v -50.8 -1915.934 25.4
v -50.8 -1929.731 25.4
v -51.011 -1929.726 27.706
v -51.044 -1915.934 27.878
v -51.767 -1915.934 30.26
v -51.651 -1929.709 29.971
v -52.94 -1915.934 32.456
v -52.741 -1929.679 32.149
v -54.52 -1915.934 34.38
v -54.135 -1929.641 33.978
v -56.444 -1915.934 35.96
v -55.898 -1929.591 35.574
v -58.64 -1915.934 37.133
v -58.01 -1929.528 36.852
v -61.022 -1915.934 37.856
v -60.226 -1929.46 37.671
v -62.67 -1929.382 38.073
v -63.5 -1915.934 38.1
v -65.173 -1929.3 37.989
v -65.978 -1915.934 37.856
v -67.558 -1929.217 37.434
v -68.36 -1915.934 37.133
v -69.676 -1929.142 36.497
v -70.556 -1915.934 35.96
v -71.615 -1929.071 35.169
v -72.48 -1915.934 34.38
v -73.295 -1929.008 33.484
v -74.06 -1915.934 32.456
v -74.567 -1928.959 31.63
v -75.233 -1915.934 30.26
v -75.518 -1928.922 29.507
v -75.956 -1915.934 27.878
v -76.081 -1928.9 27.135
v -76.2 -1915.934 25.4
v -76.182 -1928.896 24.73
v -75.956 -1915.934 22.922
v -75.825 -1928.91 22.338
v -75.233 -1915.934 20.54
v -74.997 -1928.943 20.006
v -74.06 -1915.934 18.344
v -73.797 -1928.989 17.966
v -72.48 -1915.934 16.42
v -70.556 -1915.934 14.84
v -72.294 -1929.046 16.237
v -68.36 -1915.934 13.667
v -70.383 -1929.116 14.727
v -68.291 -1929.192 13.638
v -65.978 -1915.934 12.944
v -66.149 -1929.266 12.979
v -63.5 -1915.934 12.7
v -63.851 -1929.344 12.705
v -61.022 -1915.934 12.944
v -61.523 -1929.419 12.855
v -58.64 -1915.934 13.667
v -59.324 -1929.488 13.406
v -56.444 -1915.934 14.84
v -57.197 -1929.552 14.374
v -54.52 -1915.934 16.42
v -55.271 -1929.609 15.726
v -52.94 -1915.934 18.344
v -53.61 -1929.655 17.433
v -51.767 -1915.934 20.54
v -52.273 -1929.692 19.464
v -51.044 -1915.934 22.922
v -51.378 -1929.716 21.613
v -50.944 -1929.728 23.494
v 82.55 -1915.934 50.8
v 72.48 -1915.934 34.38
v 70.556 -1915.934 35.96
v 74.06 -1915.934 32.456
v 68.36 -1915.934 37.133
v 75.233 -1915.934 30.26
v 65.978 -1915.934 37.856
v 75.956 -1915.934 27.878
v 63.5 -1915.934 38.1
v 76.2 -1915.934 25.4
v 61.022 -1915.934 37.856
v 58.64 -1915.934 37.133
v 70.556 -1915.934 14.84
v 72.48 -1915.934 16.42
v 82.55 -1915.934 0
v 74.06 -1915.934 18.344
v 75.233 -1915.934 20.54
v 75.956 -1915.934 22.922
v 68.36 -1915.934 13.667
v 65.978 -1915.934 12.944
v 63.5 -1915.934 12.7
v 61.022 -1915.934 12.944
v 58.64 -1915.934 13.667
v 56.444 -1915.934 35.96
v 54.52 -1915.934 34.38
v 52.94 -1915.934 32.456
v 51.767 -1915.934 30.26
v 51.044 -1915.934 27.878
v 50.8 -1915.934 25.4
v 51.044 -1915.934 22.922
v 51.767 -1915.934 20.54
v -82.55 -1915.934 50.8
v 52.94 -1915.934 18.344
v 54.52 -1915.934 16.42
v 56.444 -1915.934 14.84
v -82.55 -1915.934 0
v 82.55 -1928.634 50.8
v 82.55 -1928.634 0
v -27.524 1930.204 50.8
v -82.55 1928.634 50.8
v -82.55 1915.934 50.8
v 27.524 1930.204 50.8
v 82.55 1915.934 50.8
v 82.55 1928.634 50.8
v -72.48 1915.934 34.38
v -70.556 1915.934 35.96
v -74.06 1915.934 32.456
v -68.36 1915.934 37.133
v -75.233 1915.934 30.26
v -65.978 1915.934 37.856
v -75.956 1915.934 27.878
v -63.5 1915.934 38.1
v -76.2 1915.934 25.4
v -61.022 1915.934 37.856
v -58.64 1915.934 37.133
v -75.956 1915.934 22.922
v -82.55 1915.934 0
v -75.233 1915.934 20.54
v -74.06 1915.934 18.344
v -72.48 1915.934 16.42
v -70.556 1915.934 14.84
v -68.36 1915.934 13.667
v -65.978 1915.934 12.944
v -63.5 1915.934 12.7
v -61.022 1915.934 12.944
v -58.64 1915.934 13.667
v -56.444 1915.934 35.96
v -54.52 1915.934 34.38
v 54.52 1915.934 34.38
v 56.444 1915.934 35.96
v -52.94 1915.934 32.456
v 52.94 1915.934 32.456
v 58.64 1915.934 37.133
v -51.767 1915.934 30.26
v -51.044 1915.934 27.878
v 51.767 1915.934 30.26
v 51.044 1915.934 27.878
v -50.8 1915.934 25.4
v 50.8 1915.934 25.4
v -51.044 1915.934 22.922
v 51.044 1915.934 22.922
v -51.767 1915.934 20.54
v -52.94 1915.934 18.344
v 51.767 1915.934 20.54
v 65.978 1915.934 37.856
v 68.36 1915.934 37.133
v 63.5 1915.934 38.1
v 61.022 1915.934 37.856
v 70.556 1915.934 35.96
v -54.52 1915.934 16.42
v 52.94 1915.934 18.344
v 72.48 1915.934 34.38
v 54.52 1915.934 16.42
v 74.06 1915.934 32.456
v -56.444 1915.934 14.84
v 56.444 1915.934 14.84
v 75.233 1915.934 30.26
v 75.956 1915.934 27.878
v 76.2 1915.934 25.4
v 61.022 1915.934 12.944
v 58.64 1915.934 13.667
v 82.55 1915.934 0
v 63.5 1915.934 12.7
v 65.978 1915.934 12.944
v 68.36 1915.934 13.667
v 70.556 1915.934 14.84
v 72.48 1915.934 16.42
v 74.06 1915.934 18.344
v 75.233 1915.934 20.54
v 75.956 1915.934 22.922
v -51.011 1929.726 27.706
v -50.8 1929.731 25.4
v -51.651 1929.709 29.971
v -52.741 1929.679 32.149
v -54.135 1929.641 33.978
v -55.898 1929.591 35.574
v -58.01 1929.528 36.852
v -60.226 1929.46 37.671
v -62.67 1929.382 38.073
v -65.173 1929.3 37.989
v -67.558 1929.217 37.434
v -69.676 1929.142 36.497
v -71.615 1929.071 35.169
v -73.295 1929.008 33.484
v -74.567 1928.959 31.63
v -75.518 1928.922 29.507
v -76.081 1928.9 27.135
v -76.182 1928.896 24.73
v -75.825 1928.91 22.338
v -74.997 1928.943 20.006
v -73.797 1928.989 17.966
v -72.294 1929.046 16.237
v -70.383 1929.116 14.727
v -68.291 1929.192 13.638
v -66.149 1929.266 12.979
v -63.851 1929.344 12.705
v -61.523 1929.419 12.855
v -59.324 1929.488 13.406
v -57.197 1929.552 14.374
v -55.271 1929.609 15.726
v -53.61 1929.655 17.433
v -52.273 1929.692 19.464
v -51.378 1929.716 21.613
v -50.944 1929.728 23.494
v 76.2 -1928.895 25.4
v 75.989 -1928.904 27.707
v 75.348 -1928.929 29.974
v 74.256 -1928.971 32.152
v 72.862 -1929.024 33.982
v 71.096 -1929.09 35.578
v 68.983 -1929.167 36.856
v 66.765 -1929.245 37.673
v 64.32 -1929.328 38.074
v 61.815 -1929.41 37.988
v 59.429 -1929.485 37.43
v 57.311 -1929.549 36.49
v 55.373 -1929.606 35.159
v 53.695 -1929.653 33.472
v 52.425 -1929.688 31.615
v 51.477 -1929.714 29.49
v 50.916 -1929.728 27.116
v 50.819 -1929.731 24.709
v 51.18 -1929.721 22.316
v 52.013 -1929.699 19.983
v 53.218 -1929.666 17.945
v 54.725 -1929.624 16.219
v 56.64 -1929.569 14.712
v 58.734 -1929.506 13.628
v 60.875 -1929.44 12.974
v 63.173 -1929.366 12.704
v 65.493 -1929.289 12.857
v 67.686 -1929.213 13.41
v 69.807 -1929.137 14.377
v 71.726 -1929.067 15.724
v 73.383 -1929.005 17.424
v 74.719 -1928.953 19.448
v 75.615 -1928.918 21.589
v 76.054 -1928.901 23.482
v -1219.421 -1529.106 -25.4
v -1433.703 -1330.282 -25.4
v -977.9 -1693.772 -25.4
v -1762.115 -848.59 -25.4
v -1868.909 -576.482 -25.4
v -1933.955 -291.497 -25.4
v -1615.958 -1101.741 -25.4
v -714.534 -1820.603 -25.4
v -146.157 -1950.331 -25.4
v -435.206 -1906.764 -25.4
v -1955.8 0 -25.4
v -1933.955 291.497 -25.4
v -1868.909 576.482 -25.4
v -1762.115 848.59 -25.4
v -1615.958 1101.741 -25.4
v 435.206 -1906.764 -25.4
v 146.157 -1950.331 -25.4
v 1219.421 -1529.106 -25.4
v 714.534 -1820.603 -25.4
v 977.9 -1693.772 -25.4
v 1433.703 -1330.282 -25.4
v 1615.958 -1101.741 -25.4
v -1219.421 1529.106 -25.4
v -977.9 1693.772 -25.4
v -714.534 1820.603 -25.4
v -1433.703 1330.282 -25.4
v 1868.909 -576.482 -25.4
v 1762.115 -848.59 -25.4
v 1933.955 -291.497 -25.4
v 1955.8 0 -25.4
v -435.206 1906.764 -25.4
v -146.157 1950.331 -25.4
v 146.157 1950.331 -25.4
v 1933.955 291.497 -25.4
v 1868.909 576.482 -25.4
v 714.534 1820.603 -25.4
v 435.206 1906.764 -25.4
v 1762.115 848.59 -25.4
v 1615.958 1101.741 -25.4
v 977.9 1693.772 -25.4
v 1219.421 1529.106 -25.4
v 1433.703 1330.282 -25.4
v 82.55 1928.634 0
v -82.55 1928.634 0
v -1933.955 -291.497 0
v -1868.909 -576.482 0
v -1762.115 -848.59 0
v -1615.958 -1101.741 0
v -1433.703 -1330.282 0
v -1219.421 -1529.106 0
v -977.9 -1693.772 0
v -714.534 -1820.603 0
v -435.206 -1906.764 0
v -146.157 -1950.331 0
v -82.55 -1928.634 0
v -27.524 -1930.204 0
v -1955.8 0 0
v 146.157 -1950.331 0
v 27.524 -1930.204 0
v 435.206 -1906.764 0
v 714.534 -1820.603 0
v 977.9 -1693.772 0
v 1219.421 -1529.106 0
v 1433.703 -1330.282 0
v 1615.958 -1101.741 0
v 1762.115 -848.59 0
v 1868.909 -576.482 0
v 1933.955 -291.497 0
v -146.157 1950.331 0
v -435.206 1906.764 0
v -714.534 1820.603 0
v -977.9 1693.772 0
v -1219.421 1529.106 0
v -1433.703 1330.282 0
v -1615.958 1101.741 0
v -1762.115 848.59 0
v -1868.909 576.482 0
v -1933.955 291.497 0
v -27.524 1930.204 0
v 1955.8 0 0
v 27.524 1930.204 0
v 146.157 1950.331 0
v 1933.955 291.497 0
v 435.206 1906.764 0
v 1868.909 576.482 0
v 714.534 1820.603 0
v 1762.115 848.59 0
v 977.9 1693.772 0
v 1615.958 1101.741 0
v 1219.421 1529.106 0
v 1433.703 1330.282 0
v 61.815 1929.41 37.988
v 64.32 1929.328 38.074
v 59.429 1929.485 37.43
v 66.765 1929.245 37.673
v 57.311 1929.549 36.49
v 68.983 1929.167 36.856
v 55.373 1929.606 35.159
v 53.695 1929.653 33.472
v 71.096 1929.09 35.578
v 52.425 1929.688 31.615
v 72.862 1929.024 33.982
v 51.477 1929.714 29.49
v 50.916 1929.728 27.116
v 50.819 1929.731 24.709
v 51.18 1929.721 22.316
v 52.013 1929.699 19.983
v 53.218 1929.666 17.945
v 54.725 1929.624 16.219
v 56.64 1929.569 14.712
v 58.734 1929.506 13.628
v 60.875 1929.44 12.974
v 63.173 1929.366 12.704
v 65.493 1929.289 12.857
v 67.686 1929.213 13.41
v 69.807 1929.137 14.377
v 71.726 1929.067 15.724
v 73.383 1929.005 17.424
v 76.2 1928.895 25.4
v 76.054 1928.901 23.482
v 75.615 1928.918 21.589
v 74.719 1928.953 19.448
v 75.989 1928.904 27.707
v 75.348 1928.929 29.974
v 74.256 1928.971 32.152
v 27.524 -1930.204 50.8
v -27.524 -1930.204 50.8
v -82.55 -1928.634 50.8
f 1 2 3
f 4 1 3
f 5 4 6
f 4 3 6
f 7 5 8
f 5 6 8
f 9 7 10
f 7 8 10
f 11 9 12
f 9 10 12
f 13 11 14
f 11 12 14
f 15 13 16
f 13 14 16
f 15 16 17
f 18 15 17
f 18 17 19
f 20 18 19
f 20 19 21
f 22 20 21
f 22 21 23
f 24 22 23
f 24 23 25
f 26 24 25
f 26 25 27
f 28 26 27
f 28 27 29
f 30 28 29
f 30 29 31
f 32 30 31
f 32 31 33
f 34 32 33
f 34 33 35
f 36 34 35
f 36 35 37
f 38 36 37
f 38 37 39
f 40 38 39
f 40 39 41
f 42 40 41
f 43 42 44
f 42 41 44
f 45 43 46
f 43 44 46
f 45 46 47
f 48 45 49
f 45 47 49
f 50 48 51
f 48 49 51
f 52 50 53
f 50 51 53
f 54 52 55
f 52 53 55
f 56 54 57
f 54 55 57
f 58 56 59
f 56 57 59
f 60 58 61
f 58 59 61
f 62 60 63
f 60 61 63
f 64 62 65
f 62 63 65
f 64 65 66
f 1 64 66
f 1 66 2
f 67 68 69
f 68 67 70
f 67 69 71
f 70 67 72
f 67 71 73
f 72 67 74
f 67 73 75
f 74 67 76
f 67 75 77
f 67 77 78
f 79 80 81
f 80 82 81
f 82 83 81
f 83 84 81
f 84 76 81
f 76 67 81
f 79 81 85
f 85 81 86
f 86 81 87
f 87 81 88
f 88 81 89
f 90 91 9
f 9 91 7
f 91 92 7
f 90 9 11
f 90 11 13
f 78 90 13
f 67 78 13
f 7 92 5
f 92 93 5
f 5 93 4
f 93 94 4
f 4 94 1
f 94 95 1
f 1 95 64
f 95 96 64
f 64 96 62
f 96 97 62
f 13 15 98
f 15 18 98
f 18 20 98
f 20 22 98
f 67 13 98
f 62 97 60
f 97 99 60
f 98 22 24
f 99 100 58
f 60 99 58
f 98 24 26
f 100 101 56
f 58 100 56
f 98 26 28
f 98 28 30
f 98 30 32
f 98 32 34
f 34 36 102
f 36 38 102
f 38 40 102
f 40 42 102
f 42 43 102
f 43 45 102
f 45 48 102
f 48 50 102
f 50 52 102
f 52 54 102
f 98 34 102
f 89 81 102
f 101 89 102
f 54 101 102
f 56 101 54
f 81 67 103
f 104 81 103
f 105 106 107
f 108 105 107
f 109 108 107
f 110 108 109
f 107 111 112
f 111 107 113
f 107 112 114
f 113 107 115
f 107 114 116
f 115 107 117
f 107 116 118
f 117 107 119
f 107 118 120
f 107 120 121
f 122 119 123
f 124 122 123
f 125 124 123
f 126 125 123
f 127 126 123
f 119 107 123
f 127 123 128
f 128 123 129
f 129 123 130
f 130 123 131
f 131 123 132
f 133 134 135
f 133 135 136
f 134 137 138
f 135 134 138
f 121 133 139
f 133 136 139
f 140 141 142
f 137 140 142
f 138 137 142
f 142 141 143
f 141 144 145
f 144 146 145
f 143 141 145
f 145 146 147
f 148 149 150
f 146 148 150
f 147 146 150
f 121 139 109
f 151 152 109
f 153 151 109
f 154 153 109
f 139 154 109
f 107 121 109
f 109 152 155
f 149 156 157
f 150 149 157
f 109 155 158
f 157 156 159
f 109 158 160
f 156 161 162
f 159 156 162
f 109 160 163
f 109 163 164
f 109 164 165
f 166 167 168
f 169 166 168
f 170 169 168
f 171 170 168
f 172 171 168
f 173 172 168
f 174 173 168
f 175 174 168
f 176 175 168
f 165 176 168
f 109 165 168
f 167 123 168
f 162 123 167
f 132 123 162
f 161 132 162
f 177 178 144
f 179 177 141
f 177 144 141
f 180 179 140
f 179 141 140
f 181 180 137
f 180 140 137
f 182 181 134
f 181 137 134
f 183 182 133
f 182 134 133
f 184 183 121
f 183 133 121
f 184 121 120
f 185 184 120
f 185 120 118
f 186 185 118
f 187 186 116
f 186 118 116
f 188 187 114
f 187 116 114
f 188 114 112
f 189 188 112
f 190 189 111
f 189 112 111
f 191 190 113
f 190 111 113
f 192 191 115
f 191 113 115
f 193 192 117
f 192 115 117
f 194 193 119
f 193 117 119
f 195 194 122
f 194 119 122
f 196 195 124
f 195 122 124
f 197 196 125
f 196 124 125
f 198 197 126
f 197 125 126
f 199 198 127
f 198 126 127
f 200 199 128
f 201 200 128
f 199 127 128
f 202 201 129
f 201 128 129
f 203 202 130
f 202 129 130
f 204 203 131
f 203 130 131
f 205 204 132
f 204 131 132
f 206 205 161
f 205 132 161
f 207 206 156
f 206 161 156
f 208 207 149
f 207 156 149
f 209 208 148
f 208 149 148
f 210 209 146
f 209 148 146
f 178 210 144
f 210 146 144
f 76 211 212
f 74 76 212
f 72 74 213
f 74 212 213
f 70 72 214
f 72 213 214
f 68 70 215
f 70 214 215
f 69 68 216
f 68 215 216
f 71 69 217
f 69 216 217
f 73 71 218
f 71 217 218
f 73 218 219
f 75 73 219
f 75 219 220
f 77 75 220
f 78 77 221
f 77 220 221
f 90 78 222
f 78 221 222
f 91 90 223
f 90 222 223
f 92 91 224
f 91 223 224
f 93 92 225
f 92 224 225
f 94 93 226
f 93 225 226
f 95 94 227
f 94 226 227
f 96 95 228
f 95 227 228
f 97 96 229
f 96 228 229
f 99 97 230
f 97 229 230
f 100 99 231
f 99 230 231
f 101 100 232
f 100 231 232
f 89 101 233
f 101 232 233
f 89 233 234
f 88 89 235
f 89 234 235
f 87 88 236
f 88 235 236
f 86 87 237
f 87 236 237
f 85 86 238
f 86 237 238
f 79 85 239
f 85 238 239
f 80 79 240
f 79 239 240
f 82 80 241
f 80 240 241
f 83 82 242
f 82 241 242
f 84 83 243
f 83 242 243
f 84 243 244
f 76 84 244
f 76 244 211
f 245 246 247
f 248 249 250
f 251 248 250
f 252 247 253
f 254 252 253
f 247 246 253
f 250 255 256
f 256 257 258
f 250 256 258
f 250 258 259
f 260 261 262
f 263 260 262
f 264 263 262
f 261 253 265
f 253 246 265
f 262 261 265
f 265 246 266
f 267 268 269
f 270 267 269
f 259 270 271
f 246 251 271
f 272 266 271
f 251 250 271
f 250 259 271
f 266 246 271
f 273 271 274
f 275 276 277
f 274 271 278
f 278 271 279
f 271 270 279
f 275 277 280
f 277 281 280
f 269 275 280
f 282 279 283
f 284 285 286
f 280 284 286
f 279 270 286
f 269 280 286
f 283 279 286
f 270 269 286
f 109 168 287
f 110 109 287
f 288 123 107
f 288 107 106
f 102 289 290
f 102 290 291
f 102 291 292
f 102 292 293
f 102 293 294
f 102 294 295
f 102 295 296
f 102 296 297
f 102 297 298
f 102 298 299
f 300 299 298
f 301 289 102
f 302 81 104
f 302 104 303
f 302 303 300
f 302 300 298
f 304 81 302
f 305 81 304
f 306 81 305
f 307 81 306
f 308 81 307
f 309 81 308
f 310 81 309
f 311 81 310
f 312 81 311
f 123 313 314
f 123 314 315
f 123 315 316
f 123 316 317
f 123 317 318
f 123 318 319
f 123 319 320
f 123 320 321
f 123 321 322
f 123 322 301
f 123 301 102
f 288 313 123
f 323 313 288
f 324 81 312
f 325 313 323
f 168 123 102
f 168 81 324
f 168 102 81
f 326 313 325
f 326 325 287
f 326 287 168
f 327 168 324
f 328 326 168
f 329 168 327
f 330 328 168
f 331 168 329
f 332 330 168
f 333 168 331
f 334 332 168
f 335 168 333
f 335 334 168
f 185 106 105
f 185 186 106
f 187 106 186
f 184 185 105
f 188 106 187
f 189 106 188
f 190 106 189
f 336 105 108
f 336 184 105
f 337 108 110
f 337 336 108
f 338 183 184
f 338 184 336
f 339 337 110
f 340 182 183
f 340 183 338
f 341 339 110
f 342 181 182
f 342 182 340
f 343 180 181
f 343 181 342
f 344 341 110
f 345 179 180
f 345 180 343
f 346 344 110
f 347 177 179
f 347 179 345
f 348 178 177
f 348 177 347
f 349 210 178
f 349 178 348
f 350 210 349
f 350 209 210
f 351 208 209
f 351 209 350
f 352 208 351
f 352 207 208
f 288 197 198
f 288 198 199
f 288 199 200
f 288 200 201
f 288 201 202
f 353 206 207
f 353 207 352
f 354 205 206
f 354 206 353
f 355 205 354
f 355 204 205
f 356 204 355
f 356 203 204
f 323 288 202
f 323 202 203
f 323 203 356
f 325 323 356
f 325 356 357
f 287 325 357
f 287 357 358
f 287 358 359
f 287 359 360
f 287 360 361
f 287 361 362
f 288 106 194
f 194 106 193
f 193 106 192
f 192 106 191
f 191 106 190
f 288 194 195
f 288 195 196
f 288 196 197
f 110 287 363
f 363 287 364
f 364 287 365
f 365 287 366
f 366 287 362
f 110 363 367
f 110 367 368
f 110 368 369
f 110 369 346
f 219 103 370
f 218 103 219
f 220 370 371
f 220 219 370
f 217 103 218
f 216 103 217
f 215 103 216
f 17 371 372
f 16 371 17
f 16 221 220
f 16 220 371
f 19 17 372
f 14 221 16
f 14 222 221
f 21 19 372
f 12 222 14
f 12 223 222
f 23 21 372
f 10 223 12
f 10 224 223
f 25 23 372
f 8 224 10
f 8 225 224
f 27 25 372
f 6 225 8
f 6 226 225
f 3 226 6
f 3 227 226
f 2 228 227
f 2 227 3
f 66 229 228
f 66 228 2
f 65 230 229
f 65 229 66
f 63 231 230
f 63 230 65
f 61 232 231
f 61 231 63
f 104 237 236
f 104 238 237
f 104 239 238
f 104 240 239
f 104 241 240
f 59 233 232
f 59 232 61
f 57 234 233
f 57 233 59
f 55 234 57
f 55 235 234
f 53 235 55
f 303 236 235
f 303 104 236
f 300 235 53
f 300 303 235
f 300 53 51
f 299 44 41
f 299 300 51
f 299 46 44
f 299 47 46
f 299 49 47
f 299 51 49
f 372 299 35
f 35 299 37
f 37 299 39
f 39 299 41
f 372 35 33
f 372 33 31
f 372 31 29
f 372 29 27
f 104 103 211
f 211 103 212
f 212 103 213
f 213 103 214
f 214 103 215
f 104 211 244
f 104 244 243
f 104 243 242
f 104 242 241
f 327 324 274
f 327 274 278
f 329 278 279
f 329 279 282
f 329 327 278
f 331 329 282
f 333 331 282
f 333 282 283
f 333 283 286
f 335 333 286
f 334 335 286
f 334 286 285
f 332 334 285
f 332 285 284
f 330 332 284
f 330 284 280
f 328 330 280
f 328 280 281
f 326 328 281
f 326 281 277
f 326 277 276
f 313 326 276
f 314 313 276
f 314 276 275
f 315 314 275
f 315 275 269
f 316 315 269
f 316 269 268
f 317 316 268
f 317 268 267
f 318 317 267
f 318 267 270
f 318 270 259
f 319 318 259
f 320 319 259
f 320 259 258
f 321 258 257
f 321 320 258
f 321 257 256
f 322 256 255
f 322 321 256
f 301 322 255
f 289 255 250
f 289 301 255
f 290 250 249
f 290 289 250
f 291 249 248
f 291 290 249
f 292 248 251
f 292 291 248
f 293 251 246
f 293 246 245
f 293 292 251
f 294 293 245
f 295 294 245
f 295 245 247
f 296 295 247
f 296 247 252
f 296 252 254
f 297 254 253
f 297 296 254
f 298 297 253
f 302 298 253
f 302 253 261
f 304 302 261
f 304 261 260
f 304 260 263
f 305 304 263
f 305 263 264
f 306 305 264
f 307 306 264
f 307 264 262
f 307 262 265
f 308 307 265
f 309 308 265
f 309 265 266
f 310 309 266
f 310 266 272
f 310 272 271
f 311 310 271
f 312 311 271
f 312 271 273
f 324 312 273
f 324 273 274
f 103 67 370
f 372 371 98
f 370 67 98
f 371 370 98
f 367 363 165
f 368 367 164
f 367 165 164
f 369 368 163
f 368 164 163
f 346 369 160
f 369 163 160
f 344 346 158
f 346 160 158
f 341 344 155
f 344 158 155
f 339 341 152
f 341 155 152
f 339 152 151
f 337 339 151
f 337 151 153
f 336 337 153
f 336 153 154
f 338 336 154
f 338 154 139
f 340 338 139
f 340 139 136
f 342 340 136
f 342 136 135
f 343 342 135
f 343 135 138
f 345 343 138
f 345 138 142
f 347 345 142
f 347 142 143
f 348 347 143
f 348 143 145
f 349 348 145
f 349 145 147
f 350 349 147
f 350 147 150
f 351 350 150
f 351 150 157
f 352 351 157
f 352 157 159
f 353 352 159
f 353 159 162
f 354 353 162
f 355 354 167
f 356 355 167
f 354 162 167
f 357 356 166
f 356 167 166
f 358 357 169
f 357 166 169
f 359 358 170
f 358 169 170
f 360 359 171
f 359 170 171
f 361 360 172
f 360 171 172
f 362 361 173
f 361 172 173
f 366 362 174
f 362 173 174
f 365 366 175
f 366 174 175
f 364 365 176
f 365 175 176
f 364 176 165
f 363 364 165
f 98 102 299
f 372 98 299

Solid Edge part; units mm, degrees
sketch "Sketch1" plane through (0, 0, 0) normal (0, 0, 1) x (1, 0, 0)
  circle A0 centre (0, 0) radius 1955.8
extrude "Protrusion1" add sketch "Sketch1" against normal blind 25.4
sketch "Sketch2" plane through (0, 0, 0) normal (0, 0, 1) x (1, 0, 0)
  line L0 (0, -1915.9341) -> (82.55, -1915.9341)
  line L1 (82.55, -1915.9341) -> (82.55, -1928.6341)
  line L2 (-82.55, -1915.9341) -> (-82.55, -1928.6341)
  line L3 (0, -1915.9341) -> (-82.55, -1915.9341)
  arc A0 (82.55, -1928.6341) -> (-82.55, -1928.6341) centre (0, 0) cw
  line L4 (0, 1915.9341) -> (82.55, 1915.9341)
  line L5 (82.55, 1915.9341) -> (82.55, 1928.6341)
  arc A1 (-82.55, 1928.6341) -> (82.55, 1928.6341) centre (0, 0) cw
  line L6 (-82.55, 1915.9341) -> (-82.55, 1928.6341)
  line L7 (0, 1915.9341) -> (-82.55, 1915.9341)
extrude "ExtrudedProtrusion_2" add sketch "Sketch2" along normal blind 50.8
sketch "Sketch3" plane through (0, -1930.4, 0) normal (0, -1, 0) x (1, 0, 0)
  circle A0 centre (-63.5, 25.4) radius 12.7
  circle A1 centre (63.5, 25.4) radius 12.7
  dimension "D1" = 25.4
  dimension "D2" = 25.4
  dimension "D3" = 127
  dimension "D4" = 63.5
  dimension "D5" = 25.4
extrude "Cutout1" cut sketch "Sketch3" against normal through all
